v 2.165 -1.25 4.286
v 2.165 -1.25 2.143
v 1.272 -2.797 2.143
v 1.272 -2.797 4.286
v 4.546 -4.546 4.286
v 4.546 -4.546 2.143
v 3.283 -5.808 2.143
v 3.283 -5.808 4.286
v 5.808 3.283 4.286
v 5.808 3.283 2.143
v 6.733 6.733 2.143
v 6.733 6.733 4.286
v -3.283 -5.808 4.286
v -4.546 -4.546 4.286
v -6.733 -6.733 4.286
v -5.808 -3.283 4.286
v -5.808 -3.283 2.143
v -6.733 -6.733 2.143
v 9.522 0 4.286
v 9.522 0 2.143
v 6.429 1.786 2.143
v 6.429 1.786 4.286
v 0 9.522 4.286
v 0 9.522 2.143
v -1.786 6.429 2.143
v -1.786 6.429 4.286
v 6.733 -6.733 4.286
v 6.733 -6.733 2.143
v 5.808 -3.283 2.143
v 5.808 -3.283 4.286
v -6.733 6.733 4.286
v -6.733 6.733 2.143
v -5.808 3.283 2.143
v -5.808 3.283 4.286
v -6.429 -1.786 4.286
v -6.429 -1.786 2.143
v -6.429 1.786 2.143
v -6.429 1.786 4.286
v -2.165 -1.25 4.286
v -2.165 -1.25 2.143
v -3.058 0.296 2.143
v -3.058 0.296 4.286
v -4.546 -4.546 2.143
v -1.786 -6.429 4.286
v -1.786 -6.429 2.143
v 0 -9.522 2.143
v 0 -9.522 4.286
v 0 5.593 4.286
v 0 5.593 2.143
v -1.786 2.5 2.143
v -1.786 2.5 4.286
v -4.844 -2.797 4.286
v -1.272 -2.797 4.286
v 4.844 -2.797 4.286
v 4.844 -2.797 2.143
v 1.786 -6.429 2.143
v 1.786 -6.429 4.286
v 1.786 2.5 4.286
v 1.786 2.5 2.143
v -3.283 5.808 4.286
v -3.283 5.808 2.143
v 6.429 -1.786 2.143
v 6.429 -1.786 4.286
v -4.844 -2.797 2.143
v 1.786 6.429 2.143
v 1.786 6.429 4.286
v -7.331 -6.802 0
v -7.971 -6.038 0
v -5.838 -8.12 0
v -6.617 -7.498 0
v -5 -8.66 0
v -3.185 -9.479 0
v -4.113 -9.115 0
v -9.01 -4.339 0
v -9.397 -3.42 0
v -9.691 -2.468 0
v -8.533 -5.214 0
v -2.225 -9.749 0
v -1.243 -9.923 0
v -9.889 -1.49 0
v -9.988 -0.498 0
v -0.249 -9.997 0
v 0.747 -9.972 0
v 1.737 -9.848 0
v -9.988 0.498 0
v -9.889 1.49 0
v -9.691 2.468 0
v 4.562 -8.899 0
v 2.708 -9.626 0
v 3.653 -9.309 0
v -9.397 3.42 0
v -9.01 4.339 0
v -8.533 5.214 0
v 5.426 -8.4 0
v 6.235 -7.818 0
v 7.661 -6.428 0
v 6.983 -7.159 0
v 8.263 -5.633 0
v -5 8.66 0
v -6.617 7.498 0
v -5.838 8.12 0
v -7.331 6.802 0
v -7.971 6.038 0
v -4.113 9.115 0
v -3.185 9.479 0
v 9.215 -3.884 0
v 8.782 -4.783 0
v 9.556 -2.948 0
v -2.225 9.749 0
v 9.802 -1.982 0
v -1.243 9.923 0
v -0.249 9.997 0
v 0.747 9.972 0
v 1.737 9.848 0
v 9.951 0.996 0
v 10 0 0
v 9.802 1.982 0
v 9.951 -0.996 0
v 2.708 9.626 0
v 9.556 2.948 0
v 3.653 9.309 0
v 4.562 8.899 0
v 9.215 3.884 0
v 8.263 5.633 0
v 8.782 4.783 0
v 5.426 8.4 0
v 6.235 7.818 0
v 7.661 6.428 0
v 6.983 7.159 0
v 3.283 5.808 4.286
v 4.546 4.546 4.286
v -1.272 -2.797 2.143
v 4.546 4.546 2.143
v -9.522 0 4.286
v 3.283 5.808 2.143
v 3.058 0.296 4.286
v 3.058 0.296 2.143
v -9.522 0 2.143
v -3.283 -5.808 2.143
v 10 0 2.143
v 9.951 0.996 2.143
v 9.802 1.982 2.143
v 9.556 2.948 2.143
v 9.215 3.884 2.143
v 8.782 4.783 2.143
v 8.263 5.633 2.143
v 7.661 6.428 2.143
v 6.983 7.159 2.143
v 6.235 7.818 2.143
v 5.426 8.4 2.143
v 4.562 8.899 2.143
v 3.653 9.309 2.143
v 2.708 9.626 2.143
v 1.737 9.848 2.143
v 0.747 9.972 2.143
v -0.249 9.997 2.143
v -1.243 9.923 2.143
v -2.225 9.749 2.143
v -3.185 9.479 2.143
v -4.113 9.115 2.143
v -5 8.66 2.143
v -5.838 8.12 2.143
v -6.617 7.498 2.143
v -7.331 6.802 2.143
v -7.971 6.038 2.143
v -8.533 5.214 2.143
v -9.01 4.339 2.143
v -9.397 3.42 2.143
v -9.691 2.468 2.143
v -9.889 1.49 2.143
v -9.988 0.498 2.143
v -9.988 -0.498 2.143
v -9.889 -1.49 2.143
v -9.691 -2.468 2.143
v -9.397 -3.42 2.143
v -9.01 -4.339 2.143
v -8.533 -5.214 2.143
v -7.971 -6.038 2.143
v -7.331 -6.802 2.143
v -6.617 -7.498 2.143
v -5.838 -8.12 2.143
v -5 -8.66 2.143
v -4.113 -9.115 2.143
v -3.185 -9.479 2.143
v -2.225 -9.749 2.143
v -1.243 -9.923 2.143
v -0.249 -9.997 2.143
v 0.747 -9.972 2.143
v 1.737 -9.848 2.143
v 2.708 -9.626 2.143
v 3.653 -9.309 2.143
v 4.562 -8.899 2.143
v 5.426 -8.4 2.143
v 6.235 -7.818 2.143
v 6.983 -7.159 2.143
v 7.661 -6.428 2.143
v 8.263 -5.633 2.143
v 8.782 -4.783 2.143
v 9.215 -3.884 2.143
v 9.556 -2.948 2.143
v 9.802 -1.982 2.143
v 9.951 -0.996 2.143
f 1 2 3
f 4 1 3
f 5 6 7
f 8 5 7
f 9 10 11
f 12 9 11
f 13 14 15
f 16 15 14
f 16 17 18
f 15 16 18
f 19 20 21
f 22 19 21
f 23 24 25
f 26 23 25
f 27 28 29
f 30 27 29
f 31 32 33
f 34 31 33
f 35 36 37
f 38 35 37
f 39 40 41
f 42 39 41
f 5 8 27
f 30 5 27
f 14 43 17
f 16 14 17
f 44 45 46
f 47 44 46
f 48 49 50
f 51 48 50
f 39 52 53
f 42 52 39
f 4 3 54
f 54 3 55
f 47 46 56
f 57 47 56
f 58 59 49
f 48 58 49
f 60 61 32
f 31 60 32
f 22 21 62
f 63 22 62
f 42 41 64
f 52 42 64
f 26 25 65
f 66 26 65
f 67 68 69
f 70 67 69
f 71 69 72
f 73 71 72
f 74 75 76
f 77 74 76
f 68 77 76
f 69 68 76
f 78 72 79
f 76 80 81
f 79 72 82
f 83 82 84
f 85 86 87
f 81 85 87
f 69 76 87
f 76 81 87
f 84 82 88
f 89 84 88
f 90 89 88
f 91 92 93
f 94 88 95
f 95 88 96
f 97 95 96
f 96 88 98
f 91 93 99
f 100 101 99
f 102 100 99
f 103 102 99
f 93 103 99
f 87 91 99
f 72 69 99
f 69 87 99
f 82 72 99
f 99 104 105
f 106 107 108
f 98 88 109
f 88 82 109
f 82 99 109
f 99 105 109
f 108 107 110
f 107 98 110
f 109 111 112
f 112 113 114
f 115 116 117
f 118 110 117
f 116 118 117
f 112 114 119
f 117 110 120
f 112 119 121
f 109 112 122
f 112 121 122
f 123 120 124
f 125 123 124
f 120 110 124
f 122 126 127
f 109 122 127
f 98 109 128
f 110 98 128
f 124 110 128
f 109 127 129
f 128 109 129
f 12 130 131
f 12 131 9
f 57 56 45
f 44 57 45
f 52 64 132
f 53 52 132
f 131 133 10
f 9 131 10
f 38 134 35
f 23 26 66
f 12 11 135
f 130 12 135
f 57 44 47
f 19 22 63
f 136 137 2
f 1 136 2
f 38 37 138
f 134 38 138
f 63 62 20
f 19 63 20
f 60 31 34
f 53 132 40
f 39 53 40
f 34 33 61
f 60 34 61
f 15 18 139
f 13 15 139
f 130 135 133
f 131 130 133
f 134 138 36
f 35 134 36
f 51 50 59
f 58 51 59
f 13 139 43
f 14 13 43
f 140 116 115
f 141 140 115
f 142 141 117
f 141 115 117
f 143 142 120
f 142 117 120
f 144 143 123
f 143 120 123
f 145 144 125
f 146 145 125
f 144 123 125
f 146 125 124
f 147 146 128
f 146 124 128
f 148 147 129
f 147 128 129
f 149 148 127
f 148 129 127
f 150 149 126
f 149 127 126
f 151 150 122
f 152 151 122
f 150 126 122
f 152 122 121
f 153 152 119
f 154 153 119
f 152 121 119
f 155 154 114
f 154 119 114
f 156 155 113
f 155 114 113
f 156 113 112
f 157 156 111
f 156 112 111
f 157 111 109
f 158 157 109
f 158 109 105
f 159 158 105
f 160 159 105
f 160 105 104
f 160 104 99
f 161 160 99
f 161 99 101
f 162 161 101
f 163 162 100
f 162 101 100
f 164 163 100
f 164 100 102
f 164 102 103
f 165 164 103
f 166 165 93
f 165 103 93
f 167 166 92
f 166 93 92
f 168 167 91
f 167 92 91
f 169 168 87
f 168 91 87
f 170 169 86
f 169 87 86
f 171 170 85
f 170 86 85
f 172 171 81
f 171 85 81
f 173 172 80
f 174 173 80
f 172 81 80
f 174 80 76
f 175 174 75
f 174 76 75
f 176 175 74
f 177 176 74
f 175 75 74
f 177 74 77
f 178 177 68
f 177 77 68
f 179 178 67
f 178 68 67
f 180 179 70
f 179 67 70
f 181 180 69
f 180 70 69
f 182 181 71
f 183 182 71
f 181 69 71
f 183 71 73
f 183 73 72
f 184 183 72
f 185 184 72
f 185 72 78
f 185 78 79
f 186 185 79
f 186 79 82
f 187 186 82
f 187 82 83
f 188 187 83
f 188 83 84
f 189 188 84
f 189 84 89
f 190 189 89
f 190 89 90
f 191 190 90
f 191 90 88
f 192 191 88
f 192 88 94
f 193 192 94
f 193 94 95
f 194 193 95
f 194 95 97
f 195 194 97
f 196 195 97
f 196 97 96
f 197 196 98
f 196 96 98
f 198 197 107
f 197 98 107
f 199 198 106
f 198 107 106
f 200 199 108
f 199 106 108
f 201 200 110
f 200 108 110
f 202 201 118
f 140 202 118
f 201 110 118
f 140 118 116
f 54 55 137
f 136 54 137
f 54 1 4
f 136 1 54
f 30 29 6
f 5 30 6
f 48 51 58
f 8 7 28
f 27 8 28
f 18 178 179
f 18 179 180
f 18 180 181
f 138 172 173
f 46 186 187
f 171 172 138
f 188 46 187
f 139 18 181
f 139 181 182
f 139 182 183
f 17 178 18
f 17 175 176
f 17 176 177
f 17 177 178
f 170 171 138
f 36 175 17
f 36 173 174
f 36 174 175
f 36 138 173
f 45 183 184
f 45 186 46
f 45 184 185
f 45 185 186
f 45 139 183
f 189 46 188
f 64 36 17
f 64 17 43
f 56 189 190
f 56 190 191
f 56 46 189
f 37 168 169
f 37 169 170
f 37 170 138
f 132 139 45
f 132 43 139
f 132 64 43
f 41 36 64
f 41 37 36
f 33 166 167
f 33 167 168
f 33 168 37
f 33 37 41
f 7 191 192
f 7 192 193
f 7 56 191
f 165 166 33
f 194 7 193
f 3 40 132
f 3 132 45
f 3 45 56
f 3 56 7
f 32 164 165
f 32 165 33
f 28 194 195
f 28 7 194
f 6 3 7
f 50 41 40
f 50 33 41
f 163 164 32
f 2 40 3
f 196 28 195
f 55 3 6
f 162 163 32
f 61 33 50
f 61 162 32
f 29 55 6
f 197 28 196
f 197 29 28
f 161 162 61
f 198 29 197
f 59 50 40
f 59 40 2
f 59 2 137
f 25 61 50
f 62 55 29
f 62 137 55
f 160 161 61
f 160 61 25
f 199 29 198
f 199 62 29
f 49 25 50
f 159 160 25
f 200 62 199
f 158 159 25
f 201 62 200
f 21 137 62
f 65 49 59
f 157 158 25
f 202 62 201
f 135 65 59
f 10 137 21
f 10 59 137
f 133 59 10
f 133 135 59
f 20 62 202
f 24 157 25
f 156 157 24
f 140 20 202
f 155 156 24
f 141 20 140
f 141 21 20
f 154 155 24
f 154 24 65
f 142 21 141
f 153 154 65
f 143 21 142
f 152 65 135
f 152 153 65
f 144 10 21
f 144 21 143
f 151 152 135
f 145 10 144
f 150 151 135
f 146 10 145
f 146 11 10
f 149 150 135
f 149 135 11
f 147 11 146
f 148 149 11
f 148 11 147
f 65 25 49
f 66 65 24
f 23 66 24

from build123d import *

# Parameters (mm, degrees)
F0_R     = 14
F1_DEPTH = 3
F3_DEPTH = 3
F4_SCALE = 0.7143


# Not quite as in the source:
# - a feature names something its author has since deleted; it is built from what else it names


with BuildPart() as f1:
    # F0 (on Top) → F1 (new body)
    with BuildSketch(Plane.XY):
        Circle(F0_R)
    extrude(amount=F1_DEPTH)

    # F2 (on face) → F3 (join)
    with BuildSketch(Plane.XY.offset(3)):
        Polygon((0, 3.5), (2.5, 3.5), (0, 7.8301270189), (-2.5, 3.5), align=None)
        Polygon((-1.7810889132, -3.9150635095), (-3.0310888244, -1.7500001539), (-4.2810889132, 0.4150635095), (-6.7810889132, -3.9150635095), align=None)
        Polygon((4.2810889132, 0.4150635095), (3.0310888244, -1.7500001539), (1.7810889132, -3.9150635095), (6.7810889132, -3.9150635095), align=None)
        Polygon((-8.1317279836, 4.5961940777), (-6.3639610341, 6.3639610272), (-4.5961940777, 8.1317279836), (-9.4258232092, 9.4258232092), align=None)
        Polygon((0, 9), (2.5, 9), (0, 13.3301270189), (-2.5, 9), align=None)
        Polygon((4.5961940777, 8.1317279836), (6.3639610512, 6.3639610102), (8.1317279836, 4.5961940777), (9.4258232092, 9.4258232092), align=None)
        Polygon((9, 2.5), (9, 0), (9, -2.5), (13.3301270189, 0), align=None)
        Polygon((8.1317279836, -4.5961940777), (6.3639610307, -6.3639610307), (4.5961940777, -8.1317279836), (9.4258232092, -9.4258232092), align=None)
        Polygon((2.5, -9), (0, -9), (-2.5, -9), (0, -13.3301270189), align=None)
        Polygon((-4.5961940777, -8.1317279836), (-6.3639610486, -6.3639610128), (-8.1317279836, -4.5961940777), (-9.4258232092, -9.4258232092), align=None)
        Polygon((-9, -2.5), (-9, 0), (-9, 2.5), (-13.3301270189, 0), align=None)
    extrude(amount=F3_DEPTH)


with BuildPart() as f1_1:
    # F4: moved
    add(f1.part.scale(F4_SCALE))


solid = f1_1.part
